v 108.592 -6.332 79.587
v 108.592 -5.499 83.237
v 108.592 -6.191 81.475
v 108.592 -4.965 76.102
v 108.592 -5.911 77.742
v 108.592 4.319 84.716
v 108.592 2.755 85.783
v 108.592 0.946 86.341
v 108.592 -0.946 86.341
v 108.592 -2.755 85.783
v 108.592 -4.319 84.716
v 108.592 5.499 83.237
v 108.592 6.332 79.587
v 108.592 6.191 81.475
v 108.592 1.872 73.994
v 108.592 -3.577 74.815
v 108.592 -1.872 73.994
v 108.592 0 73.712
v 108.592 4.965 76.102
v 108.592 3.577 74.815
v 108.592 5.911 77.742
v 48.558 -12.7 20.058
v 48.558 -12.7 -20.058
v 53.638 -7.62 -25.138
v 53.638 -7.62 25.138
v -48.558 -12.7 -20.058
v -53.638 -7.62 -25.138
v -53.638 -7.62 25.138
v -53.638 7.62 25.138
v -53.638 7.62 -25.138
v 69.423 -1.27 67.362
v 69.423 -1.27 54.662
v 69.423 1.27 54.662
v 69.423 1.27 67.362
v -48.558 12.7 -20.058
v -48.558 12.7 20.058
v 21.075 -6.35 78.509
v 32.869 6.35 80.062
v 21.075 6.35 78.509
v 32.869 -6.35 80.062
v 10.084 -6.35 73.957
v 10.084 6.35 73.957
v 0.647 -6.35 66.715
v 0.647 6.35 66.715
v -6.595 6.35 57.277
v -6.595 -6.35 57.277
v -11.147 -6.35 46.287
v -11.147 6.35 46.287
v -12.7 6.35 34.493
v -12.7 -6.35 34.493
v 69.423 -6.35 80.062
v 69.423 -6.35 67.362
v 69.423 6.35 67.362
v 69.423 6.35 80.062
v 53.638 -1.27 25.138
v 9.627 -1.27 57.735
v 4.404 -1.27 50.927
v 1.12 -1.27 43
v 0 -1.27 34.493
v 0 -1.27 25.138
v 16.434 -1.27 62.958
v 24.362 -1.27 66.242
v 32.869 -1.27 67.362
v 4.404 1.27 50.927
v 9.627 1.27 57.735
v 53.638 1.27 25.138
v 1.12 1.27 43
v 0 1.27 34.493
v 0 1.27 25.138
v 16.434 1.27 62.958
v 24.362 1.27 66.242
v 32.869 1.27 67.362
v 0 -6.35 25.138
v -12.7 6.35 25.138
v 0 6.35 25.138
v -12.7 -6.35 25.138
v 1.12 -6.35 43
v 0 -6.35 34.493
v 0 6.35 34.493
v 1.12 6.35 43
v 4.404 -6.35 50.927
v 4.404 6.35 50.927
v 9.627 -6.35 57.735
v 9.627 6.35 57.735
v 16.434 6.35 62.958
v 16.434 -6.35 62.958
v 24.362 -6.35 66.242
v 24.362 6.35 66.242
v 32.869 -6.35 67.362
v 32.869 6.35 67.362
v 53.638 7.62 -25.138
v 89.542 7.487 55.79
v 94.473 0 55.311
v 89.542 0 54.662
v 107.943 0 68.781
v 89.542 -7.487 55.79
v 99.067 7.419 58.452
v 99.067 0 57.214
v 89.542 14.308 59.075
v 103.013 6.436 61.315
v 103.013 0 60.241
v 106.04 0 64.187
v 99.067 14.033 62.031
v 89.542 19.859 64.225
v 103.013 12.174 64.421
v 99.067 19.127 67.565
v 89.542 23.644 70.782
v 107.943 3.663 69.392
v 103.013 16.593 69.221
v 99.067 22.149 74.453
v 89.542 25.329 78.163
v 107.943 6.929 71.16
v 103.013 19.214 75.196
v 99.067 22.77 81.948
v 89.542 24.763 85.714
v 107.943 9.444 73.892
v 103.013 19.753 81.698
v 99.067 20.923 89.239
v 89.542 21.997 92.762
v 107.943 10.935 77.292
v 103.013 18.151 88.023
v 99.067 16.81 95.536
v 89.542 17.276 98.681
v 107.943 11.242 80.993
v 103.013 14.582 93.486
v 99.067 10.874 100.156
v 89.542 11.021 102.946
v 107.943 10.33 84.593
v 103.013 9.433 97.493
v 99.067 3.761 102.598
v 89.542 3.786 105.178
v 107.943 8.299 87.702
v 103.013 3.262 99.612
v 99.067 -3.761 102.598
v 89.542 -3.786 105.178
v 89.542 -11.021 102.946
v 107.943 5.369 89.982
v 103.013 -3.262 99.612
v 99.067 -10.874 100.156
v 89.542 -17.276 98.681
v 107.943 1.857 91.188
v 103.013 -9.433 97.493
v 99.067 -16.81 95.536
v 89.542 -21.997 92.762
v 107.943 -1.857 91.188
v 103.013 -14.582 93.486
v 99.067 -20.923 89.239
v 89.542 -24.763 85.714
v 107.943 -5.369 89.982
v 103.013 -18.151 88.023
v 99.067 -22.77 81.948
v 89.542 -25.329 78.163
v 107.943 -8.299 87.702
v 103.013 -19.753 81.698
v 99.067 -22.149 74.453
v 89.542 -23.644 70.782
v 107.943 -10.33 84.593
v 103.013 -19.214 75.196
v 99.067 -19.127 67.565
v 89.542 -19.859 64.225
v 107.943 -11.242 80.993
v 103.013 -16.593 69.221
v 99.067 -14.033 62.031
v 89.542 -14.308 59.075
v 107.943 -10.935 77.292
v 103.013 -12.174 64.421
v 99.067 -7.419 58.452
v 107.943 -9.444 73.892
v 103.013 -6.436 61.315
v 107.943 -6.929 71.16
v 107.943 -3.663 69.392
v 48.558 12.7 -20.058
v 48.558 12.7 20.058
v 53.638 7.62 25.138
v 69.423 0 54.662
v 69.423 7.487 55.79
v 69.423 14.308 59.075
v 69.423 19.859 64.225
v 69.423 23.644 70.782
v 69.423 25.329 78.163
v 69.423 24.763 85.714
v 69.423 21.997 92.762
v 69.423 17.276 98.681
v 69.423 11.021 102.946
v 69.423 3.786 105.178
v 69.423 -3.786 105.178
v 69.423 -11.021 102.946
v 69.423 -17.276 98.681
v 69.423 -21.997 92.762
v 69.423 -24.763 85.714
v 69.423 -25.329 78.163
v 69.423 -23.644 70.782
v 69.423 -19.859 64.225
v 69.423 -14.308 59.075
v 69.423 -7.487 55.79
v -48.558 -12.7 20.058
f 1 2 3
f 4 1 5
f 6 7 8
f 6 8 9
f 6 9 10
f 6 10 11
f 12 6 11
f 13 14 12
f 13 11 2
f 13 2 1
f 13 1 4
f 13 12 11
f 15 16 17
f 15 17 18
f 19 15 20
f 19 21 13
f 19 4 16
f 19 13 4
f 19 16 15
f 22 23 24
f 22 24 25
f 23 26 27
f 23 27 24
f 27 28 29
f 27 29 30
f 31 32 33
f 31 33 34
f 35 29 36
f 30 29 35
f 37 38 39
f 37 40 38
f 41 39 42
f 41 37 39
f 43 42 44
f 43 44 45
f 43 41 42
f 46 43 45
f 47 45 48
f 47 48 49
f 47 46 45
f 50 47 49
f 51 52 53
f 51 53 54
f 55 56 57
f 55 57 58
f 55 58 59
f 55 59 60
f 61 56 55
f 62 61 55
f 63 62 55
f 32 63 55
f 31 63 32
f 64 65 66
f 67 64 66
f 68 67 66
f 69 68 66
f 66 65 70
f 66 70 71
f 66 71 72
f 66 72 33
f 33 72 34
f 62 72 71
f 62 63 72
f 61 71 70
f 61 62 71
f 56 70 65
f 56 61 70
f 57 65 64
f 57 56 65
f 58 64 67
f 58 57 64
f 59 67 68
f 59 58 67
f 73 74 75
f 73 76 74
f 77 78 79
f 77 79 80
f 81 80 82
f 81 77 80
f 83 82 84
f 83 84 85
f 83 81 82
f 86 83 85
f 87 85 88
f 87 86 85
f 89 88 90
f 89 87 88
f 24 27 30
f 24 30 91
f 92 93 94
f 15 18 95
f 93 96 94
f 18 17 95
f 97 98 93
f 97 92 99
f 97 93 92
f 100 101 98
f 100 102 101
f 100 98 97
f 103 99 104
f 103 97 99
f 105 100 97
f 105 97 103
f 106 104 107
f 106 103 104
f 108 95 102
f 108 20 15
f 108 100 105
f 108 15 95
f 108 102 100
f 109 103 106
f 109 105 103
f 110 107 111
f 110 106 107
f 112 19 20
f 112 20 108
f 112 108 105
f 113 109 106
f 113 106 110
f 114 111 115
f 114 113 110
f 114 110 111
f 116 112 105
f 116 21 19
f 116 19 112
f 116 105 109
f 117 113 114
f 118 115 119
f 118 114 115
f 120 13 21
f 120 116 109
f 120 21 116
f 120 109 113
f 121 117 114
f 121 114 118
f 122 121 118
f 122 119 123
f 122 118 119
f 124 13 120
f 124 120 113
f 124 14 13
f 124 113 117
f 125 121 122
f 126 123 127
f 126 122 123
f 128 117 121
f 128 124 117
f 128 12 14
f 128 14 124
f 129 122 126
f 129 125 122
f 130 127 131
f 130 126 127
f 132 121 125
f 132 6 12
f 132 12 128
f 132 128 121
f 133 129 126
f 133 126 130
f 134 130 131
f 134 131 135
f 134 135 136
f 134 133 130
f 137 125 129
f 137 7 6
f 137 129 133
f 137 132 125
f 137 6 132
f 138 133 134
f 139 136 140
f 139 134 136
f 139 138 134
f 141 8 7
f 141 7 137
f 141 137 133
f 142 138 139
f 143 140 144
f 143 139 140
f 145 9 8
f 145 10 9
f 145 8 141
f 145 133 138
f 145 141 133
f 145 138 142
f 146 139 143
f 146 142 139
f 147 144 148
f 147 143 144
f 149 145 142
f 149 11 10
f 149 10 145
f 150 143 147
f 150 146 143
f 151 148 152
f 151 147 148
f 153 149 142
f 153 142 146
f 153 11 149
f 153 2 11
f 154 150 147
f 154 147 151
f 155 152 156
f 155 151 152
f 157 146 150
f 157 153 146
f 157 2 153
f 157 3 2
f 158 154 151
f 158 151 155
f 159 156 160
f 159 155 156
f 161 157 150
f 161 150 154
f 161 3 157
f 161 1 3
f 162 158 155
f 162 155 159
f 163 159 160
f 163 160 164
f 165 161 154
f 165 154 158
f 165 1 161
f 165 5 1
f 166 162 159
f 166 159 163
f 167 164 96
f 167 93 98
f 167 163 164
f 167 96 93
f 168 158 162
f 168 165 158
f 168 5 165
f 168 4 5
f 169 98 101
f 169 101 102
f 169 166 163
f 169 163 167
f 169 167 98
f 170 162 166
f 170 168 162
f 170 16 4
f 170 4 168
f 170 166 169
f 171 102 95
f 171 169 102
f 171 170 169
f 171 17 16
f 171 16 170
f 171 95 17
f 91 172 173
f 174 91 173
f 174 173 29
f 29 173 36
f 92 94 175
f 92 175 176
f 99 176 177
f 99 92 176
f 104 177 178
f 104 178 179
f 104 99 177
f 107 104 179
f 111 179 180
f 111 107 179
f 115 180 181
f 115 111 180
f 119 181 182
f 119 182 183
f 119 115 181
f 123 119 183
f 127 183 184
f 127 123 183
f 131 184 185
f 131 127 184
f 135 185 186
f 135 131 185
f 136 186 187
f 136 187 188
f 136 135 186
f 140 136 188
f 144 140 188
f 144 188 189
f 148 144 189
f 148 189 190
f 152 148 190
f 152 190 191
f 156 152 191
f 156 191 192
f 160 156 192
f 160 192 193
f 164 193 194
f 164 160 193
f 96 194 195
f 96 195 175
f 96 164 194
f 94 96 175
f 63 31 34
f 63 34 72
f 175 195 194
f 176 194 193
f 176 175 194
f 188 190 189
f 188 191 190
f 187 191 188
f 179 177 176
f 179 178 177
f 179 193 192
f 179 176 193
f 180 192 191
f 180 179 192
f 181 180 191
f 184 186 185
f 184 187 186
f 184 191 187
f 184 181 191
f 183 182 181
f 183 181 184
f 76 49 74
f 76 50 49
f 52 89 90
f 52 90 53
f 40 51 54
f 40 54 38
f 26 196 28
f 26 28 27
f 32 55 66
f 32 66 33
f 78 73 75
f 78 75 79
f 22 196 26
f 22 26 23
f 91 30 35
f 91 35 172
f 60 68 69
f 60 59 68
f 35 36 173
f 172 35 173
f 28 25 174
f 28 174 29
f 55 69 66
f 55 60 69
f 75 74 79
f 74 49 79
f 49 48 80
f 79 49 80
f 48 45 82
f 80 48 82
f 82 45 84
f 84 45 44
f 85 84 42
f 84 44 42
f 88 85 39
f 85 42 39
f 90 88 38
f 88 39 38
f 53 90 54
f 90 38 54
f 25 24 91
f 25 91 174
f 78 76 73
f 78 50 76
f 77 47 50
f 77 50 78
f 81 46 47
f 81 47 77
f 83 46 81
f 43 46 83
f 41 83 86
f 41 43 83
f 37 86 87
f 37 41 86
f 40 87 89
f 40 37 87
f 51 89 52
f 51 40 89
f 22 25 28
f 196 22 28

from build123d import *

# Parameters (mm, degrees)
F1_DEPTH = 12.7
F3_DEPTH = 6.35
F4_DEPTH = 1.27
F5_R     = 19.05
F6_SIZE  = 5.08
F7_SIZE  = 5.08


with BuildPart() as f1:
    # F0 (on Front) → F1 (new body, symmetric)
    with BuildSketch(Plane.XZ):
        Polygon((53.6384955049, -25.1384768635), (53.6384955049, 25.1384768635), (0, 25.1384768635), (-12.7, 25.1384768635), (-53.6384955049, 25.1384768635), (-53.6384955049, -25.1384768635), align=None)
    extrude(amount=F1_DEPTH, both=True)

    # F6
    f6_edges = [f1.edges().sort_by_distance(p)[0] for p in [
        (-53.638496, -12.7, 0),
        (0, -12.7, 25.138477),
        (53.638496, -12.7, 0),
        (0, -12.7, -25.138477),
    ]]
    chamfer(f6_edges, length=F6_SIZE)

    # F7
    f7_edges = [f1.edges().sort_by_distance(p)[0] for p in [
        (0, 12.7, 25.138477),
        (53.638496, 12.7, 0),
        (0, 12.7, -25.138477),
        (-53.638496, 12.7, 0),
    ]]
    chamfer(f7_edges, length=F7_SIZE)


with BuildPart() as f2:
    # F0 (on Front) → F2 (revolve)
    with BuildSketch(Plane.XZ):
        Polygon((69.4231241941, 67.3615719795), (69.4231241941, 54.6615719795), (108.5923761129, 54.6615719795), (108.5923761129, 80.0615719795), (89.0077501535, 80.0615719795), (69.4231241941, 80.0615719795), align=None)
    revolve(axis=Axis((89.0077501535, 0, 80.0615719795), (1, 0, 0)))

    # F5
    f5_edges = [f2.edges().sort_by_distance(p)[0] for p in [
        (108.592376, 0, 105.461572),
    ]]
    fillet(f5_edges, radius=F5_R)


with BuildPart() as f3:
    # F0 (on Front) → F3 (new body, symmetric)
    with BuildSketch(Plane.XZ):
        with BuildLine():
            Line((-12.7, 25.1384768635), (0, 25.1384768635))
            Line((0, 25.1384768635), (0, 34.4926992388))
            ThreePointArc((0, 34.4926992388), (9.6270699358, 57.7345020437), (32.8688727407, 67.3615719795))
            Line((32.8688727407, 67.3615719795), (69.4231241941, 67.3615719795))
            Line((69.4231241941, 67.3615719795), (69.4231241941, 80.0615719795))
            Line((69.4231241941, 80.0615719795), (32.8688727407, 80.0615719795))
            ThreePointArc((32.8688727407, 80.0615719795), (0.6468138147, 66.7147581648), (-12.7, 34.4926992388))
            Line((-12.7, 34.4926992388), (-12.7, 25.1384768635))
        make_face()
    extrude(amount=F3_DEPTH, both=True)


with BuildPart() as f4:
    # F0 (on Front) → F4 (new body, symmetric)
    with BuildSketch(Plane.XZ):
        with BuildLine():
            Line((0, 25.1384768635), (53.6384955049, 25.1384768635))
            Line((53.6384955049, 25.1384768635), (69.4231241941, 54.6615719795))
            Line((69.4231241941, 54.6615719795), (69.4231241941, 67.3615719795))
            Line((69.4231241941, 67.3615719795), (32.8688727407, 67.3615719795))
            ThreePointArc((32.8688727407, 67.3615719795), (9.6270699358, 57.7345020437), (0, 34.4926992388))
            Line((0, 34.4926992388), (0, 25.1384768635))
        make_face()
    extrude(amount=F4_DEPTH, both=True)


solid = Compound([f1.part, f2.part, f3.part, f4.part])
